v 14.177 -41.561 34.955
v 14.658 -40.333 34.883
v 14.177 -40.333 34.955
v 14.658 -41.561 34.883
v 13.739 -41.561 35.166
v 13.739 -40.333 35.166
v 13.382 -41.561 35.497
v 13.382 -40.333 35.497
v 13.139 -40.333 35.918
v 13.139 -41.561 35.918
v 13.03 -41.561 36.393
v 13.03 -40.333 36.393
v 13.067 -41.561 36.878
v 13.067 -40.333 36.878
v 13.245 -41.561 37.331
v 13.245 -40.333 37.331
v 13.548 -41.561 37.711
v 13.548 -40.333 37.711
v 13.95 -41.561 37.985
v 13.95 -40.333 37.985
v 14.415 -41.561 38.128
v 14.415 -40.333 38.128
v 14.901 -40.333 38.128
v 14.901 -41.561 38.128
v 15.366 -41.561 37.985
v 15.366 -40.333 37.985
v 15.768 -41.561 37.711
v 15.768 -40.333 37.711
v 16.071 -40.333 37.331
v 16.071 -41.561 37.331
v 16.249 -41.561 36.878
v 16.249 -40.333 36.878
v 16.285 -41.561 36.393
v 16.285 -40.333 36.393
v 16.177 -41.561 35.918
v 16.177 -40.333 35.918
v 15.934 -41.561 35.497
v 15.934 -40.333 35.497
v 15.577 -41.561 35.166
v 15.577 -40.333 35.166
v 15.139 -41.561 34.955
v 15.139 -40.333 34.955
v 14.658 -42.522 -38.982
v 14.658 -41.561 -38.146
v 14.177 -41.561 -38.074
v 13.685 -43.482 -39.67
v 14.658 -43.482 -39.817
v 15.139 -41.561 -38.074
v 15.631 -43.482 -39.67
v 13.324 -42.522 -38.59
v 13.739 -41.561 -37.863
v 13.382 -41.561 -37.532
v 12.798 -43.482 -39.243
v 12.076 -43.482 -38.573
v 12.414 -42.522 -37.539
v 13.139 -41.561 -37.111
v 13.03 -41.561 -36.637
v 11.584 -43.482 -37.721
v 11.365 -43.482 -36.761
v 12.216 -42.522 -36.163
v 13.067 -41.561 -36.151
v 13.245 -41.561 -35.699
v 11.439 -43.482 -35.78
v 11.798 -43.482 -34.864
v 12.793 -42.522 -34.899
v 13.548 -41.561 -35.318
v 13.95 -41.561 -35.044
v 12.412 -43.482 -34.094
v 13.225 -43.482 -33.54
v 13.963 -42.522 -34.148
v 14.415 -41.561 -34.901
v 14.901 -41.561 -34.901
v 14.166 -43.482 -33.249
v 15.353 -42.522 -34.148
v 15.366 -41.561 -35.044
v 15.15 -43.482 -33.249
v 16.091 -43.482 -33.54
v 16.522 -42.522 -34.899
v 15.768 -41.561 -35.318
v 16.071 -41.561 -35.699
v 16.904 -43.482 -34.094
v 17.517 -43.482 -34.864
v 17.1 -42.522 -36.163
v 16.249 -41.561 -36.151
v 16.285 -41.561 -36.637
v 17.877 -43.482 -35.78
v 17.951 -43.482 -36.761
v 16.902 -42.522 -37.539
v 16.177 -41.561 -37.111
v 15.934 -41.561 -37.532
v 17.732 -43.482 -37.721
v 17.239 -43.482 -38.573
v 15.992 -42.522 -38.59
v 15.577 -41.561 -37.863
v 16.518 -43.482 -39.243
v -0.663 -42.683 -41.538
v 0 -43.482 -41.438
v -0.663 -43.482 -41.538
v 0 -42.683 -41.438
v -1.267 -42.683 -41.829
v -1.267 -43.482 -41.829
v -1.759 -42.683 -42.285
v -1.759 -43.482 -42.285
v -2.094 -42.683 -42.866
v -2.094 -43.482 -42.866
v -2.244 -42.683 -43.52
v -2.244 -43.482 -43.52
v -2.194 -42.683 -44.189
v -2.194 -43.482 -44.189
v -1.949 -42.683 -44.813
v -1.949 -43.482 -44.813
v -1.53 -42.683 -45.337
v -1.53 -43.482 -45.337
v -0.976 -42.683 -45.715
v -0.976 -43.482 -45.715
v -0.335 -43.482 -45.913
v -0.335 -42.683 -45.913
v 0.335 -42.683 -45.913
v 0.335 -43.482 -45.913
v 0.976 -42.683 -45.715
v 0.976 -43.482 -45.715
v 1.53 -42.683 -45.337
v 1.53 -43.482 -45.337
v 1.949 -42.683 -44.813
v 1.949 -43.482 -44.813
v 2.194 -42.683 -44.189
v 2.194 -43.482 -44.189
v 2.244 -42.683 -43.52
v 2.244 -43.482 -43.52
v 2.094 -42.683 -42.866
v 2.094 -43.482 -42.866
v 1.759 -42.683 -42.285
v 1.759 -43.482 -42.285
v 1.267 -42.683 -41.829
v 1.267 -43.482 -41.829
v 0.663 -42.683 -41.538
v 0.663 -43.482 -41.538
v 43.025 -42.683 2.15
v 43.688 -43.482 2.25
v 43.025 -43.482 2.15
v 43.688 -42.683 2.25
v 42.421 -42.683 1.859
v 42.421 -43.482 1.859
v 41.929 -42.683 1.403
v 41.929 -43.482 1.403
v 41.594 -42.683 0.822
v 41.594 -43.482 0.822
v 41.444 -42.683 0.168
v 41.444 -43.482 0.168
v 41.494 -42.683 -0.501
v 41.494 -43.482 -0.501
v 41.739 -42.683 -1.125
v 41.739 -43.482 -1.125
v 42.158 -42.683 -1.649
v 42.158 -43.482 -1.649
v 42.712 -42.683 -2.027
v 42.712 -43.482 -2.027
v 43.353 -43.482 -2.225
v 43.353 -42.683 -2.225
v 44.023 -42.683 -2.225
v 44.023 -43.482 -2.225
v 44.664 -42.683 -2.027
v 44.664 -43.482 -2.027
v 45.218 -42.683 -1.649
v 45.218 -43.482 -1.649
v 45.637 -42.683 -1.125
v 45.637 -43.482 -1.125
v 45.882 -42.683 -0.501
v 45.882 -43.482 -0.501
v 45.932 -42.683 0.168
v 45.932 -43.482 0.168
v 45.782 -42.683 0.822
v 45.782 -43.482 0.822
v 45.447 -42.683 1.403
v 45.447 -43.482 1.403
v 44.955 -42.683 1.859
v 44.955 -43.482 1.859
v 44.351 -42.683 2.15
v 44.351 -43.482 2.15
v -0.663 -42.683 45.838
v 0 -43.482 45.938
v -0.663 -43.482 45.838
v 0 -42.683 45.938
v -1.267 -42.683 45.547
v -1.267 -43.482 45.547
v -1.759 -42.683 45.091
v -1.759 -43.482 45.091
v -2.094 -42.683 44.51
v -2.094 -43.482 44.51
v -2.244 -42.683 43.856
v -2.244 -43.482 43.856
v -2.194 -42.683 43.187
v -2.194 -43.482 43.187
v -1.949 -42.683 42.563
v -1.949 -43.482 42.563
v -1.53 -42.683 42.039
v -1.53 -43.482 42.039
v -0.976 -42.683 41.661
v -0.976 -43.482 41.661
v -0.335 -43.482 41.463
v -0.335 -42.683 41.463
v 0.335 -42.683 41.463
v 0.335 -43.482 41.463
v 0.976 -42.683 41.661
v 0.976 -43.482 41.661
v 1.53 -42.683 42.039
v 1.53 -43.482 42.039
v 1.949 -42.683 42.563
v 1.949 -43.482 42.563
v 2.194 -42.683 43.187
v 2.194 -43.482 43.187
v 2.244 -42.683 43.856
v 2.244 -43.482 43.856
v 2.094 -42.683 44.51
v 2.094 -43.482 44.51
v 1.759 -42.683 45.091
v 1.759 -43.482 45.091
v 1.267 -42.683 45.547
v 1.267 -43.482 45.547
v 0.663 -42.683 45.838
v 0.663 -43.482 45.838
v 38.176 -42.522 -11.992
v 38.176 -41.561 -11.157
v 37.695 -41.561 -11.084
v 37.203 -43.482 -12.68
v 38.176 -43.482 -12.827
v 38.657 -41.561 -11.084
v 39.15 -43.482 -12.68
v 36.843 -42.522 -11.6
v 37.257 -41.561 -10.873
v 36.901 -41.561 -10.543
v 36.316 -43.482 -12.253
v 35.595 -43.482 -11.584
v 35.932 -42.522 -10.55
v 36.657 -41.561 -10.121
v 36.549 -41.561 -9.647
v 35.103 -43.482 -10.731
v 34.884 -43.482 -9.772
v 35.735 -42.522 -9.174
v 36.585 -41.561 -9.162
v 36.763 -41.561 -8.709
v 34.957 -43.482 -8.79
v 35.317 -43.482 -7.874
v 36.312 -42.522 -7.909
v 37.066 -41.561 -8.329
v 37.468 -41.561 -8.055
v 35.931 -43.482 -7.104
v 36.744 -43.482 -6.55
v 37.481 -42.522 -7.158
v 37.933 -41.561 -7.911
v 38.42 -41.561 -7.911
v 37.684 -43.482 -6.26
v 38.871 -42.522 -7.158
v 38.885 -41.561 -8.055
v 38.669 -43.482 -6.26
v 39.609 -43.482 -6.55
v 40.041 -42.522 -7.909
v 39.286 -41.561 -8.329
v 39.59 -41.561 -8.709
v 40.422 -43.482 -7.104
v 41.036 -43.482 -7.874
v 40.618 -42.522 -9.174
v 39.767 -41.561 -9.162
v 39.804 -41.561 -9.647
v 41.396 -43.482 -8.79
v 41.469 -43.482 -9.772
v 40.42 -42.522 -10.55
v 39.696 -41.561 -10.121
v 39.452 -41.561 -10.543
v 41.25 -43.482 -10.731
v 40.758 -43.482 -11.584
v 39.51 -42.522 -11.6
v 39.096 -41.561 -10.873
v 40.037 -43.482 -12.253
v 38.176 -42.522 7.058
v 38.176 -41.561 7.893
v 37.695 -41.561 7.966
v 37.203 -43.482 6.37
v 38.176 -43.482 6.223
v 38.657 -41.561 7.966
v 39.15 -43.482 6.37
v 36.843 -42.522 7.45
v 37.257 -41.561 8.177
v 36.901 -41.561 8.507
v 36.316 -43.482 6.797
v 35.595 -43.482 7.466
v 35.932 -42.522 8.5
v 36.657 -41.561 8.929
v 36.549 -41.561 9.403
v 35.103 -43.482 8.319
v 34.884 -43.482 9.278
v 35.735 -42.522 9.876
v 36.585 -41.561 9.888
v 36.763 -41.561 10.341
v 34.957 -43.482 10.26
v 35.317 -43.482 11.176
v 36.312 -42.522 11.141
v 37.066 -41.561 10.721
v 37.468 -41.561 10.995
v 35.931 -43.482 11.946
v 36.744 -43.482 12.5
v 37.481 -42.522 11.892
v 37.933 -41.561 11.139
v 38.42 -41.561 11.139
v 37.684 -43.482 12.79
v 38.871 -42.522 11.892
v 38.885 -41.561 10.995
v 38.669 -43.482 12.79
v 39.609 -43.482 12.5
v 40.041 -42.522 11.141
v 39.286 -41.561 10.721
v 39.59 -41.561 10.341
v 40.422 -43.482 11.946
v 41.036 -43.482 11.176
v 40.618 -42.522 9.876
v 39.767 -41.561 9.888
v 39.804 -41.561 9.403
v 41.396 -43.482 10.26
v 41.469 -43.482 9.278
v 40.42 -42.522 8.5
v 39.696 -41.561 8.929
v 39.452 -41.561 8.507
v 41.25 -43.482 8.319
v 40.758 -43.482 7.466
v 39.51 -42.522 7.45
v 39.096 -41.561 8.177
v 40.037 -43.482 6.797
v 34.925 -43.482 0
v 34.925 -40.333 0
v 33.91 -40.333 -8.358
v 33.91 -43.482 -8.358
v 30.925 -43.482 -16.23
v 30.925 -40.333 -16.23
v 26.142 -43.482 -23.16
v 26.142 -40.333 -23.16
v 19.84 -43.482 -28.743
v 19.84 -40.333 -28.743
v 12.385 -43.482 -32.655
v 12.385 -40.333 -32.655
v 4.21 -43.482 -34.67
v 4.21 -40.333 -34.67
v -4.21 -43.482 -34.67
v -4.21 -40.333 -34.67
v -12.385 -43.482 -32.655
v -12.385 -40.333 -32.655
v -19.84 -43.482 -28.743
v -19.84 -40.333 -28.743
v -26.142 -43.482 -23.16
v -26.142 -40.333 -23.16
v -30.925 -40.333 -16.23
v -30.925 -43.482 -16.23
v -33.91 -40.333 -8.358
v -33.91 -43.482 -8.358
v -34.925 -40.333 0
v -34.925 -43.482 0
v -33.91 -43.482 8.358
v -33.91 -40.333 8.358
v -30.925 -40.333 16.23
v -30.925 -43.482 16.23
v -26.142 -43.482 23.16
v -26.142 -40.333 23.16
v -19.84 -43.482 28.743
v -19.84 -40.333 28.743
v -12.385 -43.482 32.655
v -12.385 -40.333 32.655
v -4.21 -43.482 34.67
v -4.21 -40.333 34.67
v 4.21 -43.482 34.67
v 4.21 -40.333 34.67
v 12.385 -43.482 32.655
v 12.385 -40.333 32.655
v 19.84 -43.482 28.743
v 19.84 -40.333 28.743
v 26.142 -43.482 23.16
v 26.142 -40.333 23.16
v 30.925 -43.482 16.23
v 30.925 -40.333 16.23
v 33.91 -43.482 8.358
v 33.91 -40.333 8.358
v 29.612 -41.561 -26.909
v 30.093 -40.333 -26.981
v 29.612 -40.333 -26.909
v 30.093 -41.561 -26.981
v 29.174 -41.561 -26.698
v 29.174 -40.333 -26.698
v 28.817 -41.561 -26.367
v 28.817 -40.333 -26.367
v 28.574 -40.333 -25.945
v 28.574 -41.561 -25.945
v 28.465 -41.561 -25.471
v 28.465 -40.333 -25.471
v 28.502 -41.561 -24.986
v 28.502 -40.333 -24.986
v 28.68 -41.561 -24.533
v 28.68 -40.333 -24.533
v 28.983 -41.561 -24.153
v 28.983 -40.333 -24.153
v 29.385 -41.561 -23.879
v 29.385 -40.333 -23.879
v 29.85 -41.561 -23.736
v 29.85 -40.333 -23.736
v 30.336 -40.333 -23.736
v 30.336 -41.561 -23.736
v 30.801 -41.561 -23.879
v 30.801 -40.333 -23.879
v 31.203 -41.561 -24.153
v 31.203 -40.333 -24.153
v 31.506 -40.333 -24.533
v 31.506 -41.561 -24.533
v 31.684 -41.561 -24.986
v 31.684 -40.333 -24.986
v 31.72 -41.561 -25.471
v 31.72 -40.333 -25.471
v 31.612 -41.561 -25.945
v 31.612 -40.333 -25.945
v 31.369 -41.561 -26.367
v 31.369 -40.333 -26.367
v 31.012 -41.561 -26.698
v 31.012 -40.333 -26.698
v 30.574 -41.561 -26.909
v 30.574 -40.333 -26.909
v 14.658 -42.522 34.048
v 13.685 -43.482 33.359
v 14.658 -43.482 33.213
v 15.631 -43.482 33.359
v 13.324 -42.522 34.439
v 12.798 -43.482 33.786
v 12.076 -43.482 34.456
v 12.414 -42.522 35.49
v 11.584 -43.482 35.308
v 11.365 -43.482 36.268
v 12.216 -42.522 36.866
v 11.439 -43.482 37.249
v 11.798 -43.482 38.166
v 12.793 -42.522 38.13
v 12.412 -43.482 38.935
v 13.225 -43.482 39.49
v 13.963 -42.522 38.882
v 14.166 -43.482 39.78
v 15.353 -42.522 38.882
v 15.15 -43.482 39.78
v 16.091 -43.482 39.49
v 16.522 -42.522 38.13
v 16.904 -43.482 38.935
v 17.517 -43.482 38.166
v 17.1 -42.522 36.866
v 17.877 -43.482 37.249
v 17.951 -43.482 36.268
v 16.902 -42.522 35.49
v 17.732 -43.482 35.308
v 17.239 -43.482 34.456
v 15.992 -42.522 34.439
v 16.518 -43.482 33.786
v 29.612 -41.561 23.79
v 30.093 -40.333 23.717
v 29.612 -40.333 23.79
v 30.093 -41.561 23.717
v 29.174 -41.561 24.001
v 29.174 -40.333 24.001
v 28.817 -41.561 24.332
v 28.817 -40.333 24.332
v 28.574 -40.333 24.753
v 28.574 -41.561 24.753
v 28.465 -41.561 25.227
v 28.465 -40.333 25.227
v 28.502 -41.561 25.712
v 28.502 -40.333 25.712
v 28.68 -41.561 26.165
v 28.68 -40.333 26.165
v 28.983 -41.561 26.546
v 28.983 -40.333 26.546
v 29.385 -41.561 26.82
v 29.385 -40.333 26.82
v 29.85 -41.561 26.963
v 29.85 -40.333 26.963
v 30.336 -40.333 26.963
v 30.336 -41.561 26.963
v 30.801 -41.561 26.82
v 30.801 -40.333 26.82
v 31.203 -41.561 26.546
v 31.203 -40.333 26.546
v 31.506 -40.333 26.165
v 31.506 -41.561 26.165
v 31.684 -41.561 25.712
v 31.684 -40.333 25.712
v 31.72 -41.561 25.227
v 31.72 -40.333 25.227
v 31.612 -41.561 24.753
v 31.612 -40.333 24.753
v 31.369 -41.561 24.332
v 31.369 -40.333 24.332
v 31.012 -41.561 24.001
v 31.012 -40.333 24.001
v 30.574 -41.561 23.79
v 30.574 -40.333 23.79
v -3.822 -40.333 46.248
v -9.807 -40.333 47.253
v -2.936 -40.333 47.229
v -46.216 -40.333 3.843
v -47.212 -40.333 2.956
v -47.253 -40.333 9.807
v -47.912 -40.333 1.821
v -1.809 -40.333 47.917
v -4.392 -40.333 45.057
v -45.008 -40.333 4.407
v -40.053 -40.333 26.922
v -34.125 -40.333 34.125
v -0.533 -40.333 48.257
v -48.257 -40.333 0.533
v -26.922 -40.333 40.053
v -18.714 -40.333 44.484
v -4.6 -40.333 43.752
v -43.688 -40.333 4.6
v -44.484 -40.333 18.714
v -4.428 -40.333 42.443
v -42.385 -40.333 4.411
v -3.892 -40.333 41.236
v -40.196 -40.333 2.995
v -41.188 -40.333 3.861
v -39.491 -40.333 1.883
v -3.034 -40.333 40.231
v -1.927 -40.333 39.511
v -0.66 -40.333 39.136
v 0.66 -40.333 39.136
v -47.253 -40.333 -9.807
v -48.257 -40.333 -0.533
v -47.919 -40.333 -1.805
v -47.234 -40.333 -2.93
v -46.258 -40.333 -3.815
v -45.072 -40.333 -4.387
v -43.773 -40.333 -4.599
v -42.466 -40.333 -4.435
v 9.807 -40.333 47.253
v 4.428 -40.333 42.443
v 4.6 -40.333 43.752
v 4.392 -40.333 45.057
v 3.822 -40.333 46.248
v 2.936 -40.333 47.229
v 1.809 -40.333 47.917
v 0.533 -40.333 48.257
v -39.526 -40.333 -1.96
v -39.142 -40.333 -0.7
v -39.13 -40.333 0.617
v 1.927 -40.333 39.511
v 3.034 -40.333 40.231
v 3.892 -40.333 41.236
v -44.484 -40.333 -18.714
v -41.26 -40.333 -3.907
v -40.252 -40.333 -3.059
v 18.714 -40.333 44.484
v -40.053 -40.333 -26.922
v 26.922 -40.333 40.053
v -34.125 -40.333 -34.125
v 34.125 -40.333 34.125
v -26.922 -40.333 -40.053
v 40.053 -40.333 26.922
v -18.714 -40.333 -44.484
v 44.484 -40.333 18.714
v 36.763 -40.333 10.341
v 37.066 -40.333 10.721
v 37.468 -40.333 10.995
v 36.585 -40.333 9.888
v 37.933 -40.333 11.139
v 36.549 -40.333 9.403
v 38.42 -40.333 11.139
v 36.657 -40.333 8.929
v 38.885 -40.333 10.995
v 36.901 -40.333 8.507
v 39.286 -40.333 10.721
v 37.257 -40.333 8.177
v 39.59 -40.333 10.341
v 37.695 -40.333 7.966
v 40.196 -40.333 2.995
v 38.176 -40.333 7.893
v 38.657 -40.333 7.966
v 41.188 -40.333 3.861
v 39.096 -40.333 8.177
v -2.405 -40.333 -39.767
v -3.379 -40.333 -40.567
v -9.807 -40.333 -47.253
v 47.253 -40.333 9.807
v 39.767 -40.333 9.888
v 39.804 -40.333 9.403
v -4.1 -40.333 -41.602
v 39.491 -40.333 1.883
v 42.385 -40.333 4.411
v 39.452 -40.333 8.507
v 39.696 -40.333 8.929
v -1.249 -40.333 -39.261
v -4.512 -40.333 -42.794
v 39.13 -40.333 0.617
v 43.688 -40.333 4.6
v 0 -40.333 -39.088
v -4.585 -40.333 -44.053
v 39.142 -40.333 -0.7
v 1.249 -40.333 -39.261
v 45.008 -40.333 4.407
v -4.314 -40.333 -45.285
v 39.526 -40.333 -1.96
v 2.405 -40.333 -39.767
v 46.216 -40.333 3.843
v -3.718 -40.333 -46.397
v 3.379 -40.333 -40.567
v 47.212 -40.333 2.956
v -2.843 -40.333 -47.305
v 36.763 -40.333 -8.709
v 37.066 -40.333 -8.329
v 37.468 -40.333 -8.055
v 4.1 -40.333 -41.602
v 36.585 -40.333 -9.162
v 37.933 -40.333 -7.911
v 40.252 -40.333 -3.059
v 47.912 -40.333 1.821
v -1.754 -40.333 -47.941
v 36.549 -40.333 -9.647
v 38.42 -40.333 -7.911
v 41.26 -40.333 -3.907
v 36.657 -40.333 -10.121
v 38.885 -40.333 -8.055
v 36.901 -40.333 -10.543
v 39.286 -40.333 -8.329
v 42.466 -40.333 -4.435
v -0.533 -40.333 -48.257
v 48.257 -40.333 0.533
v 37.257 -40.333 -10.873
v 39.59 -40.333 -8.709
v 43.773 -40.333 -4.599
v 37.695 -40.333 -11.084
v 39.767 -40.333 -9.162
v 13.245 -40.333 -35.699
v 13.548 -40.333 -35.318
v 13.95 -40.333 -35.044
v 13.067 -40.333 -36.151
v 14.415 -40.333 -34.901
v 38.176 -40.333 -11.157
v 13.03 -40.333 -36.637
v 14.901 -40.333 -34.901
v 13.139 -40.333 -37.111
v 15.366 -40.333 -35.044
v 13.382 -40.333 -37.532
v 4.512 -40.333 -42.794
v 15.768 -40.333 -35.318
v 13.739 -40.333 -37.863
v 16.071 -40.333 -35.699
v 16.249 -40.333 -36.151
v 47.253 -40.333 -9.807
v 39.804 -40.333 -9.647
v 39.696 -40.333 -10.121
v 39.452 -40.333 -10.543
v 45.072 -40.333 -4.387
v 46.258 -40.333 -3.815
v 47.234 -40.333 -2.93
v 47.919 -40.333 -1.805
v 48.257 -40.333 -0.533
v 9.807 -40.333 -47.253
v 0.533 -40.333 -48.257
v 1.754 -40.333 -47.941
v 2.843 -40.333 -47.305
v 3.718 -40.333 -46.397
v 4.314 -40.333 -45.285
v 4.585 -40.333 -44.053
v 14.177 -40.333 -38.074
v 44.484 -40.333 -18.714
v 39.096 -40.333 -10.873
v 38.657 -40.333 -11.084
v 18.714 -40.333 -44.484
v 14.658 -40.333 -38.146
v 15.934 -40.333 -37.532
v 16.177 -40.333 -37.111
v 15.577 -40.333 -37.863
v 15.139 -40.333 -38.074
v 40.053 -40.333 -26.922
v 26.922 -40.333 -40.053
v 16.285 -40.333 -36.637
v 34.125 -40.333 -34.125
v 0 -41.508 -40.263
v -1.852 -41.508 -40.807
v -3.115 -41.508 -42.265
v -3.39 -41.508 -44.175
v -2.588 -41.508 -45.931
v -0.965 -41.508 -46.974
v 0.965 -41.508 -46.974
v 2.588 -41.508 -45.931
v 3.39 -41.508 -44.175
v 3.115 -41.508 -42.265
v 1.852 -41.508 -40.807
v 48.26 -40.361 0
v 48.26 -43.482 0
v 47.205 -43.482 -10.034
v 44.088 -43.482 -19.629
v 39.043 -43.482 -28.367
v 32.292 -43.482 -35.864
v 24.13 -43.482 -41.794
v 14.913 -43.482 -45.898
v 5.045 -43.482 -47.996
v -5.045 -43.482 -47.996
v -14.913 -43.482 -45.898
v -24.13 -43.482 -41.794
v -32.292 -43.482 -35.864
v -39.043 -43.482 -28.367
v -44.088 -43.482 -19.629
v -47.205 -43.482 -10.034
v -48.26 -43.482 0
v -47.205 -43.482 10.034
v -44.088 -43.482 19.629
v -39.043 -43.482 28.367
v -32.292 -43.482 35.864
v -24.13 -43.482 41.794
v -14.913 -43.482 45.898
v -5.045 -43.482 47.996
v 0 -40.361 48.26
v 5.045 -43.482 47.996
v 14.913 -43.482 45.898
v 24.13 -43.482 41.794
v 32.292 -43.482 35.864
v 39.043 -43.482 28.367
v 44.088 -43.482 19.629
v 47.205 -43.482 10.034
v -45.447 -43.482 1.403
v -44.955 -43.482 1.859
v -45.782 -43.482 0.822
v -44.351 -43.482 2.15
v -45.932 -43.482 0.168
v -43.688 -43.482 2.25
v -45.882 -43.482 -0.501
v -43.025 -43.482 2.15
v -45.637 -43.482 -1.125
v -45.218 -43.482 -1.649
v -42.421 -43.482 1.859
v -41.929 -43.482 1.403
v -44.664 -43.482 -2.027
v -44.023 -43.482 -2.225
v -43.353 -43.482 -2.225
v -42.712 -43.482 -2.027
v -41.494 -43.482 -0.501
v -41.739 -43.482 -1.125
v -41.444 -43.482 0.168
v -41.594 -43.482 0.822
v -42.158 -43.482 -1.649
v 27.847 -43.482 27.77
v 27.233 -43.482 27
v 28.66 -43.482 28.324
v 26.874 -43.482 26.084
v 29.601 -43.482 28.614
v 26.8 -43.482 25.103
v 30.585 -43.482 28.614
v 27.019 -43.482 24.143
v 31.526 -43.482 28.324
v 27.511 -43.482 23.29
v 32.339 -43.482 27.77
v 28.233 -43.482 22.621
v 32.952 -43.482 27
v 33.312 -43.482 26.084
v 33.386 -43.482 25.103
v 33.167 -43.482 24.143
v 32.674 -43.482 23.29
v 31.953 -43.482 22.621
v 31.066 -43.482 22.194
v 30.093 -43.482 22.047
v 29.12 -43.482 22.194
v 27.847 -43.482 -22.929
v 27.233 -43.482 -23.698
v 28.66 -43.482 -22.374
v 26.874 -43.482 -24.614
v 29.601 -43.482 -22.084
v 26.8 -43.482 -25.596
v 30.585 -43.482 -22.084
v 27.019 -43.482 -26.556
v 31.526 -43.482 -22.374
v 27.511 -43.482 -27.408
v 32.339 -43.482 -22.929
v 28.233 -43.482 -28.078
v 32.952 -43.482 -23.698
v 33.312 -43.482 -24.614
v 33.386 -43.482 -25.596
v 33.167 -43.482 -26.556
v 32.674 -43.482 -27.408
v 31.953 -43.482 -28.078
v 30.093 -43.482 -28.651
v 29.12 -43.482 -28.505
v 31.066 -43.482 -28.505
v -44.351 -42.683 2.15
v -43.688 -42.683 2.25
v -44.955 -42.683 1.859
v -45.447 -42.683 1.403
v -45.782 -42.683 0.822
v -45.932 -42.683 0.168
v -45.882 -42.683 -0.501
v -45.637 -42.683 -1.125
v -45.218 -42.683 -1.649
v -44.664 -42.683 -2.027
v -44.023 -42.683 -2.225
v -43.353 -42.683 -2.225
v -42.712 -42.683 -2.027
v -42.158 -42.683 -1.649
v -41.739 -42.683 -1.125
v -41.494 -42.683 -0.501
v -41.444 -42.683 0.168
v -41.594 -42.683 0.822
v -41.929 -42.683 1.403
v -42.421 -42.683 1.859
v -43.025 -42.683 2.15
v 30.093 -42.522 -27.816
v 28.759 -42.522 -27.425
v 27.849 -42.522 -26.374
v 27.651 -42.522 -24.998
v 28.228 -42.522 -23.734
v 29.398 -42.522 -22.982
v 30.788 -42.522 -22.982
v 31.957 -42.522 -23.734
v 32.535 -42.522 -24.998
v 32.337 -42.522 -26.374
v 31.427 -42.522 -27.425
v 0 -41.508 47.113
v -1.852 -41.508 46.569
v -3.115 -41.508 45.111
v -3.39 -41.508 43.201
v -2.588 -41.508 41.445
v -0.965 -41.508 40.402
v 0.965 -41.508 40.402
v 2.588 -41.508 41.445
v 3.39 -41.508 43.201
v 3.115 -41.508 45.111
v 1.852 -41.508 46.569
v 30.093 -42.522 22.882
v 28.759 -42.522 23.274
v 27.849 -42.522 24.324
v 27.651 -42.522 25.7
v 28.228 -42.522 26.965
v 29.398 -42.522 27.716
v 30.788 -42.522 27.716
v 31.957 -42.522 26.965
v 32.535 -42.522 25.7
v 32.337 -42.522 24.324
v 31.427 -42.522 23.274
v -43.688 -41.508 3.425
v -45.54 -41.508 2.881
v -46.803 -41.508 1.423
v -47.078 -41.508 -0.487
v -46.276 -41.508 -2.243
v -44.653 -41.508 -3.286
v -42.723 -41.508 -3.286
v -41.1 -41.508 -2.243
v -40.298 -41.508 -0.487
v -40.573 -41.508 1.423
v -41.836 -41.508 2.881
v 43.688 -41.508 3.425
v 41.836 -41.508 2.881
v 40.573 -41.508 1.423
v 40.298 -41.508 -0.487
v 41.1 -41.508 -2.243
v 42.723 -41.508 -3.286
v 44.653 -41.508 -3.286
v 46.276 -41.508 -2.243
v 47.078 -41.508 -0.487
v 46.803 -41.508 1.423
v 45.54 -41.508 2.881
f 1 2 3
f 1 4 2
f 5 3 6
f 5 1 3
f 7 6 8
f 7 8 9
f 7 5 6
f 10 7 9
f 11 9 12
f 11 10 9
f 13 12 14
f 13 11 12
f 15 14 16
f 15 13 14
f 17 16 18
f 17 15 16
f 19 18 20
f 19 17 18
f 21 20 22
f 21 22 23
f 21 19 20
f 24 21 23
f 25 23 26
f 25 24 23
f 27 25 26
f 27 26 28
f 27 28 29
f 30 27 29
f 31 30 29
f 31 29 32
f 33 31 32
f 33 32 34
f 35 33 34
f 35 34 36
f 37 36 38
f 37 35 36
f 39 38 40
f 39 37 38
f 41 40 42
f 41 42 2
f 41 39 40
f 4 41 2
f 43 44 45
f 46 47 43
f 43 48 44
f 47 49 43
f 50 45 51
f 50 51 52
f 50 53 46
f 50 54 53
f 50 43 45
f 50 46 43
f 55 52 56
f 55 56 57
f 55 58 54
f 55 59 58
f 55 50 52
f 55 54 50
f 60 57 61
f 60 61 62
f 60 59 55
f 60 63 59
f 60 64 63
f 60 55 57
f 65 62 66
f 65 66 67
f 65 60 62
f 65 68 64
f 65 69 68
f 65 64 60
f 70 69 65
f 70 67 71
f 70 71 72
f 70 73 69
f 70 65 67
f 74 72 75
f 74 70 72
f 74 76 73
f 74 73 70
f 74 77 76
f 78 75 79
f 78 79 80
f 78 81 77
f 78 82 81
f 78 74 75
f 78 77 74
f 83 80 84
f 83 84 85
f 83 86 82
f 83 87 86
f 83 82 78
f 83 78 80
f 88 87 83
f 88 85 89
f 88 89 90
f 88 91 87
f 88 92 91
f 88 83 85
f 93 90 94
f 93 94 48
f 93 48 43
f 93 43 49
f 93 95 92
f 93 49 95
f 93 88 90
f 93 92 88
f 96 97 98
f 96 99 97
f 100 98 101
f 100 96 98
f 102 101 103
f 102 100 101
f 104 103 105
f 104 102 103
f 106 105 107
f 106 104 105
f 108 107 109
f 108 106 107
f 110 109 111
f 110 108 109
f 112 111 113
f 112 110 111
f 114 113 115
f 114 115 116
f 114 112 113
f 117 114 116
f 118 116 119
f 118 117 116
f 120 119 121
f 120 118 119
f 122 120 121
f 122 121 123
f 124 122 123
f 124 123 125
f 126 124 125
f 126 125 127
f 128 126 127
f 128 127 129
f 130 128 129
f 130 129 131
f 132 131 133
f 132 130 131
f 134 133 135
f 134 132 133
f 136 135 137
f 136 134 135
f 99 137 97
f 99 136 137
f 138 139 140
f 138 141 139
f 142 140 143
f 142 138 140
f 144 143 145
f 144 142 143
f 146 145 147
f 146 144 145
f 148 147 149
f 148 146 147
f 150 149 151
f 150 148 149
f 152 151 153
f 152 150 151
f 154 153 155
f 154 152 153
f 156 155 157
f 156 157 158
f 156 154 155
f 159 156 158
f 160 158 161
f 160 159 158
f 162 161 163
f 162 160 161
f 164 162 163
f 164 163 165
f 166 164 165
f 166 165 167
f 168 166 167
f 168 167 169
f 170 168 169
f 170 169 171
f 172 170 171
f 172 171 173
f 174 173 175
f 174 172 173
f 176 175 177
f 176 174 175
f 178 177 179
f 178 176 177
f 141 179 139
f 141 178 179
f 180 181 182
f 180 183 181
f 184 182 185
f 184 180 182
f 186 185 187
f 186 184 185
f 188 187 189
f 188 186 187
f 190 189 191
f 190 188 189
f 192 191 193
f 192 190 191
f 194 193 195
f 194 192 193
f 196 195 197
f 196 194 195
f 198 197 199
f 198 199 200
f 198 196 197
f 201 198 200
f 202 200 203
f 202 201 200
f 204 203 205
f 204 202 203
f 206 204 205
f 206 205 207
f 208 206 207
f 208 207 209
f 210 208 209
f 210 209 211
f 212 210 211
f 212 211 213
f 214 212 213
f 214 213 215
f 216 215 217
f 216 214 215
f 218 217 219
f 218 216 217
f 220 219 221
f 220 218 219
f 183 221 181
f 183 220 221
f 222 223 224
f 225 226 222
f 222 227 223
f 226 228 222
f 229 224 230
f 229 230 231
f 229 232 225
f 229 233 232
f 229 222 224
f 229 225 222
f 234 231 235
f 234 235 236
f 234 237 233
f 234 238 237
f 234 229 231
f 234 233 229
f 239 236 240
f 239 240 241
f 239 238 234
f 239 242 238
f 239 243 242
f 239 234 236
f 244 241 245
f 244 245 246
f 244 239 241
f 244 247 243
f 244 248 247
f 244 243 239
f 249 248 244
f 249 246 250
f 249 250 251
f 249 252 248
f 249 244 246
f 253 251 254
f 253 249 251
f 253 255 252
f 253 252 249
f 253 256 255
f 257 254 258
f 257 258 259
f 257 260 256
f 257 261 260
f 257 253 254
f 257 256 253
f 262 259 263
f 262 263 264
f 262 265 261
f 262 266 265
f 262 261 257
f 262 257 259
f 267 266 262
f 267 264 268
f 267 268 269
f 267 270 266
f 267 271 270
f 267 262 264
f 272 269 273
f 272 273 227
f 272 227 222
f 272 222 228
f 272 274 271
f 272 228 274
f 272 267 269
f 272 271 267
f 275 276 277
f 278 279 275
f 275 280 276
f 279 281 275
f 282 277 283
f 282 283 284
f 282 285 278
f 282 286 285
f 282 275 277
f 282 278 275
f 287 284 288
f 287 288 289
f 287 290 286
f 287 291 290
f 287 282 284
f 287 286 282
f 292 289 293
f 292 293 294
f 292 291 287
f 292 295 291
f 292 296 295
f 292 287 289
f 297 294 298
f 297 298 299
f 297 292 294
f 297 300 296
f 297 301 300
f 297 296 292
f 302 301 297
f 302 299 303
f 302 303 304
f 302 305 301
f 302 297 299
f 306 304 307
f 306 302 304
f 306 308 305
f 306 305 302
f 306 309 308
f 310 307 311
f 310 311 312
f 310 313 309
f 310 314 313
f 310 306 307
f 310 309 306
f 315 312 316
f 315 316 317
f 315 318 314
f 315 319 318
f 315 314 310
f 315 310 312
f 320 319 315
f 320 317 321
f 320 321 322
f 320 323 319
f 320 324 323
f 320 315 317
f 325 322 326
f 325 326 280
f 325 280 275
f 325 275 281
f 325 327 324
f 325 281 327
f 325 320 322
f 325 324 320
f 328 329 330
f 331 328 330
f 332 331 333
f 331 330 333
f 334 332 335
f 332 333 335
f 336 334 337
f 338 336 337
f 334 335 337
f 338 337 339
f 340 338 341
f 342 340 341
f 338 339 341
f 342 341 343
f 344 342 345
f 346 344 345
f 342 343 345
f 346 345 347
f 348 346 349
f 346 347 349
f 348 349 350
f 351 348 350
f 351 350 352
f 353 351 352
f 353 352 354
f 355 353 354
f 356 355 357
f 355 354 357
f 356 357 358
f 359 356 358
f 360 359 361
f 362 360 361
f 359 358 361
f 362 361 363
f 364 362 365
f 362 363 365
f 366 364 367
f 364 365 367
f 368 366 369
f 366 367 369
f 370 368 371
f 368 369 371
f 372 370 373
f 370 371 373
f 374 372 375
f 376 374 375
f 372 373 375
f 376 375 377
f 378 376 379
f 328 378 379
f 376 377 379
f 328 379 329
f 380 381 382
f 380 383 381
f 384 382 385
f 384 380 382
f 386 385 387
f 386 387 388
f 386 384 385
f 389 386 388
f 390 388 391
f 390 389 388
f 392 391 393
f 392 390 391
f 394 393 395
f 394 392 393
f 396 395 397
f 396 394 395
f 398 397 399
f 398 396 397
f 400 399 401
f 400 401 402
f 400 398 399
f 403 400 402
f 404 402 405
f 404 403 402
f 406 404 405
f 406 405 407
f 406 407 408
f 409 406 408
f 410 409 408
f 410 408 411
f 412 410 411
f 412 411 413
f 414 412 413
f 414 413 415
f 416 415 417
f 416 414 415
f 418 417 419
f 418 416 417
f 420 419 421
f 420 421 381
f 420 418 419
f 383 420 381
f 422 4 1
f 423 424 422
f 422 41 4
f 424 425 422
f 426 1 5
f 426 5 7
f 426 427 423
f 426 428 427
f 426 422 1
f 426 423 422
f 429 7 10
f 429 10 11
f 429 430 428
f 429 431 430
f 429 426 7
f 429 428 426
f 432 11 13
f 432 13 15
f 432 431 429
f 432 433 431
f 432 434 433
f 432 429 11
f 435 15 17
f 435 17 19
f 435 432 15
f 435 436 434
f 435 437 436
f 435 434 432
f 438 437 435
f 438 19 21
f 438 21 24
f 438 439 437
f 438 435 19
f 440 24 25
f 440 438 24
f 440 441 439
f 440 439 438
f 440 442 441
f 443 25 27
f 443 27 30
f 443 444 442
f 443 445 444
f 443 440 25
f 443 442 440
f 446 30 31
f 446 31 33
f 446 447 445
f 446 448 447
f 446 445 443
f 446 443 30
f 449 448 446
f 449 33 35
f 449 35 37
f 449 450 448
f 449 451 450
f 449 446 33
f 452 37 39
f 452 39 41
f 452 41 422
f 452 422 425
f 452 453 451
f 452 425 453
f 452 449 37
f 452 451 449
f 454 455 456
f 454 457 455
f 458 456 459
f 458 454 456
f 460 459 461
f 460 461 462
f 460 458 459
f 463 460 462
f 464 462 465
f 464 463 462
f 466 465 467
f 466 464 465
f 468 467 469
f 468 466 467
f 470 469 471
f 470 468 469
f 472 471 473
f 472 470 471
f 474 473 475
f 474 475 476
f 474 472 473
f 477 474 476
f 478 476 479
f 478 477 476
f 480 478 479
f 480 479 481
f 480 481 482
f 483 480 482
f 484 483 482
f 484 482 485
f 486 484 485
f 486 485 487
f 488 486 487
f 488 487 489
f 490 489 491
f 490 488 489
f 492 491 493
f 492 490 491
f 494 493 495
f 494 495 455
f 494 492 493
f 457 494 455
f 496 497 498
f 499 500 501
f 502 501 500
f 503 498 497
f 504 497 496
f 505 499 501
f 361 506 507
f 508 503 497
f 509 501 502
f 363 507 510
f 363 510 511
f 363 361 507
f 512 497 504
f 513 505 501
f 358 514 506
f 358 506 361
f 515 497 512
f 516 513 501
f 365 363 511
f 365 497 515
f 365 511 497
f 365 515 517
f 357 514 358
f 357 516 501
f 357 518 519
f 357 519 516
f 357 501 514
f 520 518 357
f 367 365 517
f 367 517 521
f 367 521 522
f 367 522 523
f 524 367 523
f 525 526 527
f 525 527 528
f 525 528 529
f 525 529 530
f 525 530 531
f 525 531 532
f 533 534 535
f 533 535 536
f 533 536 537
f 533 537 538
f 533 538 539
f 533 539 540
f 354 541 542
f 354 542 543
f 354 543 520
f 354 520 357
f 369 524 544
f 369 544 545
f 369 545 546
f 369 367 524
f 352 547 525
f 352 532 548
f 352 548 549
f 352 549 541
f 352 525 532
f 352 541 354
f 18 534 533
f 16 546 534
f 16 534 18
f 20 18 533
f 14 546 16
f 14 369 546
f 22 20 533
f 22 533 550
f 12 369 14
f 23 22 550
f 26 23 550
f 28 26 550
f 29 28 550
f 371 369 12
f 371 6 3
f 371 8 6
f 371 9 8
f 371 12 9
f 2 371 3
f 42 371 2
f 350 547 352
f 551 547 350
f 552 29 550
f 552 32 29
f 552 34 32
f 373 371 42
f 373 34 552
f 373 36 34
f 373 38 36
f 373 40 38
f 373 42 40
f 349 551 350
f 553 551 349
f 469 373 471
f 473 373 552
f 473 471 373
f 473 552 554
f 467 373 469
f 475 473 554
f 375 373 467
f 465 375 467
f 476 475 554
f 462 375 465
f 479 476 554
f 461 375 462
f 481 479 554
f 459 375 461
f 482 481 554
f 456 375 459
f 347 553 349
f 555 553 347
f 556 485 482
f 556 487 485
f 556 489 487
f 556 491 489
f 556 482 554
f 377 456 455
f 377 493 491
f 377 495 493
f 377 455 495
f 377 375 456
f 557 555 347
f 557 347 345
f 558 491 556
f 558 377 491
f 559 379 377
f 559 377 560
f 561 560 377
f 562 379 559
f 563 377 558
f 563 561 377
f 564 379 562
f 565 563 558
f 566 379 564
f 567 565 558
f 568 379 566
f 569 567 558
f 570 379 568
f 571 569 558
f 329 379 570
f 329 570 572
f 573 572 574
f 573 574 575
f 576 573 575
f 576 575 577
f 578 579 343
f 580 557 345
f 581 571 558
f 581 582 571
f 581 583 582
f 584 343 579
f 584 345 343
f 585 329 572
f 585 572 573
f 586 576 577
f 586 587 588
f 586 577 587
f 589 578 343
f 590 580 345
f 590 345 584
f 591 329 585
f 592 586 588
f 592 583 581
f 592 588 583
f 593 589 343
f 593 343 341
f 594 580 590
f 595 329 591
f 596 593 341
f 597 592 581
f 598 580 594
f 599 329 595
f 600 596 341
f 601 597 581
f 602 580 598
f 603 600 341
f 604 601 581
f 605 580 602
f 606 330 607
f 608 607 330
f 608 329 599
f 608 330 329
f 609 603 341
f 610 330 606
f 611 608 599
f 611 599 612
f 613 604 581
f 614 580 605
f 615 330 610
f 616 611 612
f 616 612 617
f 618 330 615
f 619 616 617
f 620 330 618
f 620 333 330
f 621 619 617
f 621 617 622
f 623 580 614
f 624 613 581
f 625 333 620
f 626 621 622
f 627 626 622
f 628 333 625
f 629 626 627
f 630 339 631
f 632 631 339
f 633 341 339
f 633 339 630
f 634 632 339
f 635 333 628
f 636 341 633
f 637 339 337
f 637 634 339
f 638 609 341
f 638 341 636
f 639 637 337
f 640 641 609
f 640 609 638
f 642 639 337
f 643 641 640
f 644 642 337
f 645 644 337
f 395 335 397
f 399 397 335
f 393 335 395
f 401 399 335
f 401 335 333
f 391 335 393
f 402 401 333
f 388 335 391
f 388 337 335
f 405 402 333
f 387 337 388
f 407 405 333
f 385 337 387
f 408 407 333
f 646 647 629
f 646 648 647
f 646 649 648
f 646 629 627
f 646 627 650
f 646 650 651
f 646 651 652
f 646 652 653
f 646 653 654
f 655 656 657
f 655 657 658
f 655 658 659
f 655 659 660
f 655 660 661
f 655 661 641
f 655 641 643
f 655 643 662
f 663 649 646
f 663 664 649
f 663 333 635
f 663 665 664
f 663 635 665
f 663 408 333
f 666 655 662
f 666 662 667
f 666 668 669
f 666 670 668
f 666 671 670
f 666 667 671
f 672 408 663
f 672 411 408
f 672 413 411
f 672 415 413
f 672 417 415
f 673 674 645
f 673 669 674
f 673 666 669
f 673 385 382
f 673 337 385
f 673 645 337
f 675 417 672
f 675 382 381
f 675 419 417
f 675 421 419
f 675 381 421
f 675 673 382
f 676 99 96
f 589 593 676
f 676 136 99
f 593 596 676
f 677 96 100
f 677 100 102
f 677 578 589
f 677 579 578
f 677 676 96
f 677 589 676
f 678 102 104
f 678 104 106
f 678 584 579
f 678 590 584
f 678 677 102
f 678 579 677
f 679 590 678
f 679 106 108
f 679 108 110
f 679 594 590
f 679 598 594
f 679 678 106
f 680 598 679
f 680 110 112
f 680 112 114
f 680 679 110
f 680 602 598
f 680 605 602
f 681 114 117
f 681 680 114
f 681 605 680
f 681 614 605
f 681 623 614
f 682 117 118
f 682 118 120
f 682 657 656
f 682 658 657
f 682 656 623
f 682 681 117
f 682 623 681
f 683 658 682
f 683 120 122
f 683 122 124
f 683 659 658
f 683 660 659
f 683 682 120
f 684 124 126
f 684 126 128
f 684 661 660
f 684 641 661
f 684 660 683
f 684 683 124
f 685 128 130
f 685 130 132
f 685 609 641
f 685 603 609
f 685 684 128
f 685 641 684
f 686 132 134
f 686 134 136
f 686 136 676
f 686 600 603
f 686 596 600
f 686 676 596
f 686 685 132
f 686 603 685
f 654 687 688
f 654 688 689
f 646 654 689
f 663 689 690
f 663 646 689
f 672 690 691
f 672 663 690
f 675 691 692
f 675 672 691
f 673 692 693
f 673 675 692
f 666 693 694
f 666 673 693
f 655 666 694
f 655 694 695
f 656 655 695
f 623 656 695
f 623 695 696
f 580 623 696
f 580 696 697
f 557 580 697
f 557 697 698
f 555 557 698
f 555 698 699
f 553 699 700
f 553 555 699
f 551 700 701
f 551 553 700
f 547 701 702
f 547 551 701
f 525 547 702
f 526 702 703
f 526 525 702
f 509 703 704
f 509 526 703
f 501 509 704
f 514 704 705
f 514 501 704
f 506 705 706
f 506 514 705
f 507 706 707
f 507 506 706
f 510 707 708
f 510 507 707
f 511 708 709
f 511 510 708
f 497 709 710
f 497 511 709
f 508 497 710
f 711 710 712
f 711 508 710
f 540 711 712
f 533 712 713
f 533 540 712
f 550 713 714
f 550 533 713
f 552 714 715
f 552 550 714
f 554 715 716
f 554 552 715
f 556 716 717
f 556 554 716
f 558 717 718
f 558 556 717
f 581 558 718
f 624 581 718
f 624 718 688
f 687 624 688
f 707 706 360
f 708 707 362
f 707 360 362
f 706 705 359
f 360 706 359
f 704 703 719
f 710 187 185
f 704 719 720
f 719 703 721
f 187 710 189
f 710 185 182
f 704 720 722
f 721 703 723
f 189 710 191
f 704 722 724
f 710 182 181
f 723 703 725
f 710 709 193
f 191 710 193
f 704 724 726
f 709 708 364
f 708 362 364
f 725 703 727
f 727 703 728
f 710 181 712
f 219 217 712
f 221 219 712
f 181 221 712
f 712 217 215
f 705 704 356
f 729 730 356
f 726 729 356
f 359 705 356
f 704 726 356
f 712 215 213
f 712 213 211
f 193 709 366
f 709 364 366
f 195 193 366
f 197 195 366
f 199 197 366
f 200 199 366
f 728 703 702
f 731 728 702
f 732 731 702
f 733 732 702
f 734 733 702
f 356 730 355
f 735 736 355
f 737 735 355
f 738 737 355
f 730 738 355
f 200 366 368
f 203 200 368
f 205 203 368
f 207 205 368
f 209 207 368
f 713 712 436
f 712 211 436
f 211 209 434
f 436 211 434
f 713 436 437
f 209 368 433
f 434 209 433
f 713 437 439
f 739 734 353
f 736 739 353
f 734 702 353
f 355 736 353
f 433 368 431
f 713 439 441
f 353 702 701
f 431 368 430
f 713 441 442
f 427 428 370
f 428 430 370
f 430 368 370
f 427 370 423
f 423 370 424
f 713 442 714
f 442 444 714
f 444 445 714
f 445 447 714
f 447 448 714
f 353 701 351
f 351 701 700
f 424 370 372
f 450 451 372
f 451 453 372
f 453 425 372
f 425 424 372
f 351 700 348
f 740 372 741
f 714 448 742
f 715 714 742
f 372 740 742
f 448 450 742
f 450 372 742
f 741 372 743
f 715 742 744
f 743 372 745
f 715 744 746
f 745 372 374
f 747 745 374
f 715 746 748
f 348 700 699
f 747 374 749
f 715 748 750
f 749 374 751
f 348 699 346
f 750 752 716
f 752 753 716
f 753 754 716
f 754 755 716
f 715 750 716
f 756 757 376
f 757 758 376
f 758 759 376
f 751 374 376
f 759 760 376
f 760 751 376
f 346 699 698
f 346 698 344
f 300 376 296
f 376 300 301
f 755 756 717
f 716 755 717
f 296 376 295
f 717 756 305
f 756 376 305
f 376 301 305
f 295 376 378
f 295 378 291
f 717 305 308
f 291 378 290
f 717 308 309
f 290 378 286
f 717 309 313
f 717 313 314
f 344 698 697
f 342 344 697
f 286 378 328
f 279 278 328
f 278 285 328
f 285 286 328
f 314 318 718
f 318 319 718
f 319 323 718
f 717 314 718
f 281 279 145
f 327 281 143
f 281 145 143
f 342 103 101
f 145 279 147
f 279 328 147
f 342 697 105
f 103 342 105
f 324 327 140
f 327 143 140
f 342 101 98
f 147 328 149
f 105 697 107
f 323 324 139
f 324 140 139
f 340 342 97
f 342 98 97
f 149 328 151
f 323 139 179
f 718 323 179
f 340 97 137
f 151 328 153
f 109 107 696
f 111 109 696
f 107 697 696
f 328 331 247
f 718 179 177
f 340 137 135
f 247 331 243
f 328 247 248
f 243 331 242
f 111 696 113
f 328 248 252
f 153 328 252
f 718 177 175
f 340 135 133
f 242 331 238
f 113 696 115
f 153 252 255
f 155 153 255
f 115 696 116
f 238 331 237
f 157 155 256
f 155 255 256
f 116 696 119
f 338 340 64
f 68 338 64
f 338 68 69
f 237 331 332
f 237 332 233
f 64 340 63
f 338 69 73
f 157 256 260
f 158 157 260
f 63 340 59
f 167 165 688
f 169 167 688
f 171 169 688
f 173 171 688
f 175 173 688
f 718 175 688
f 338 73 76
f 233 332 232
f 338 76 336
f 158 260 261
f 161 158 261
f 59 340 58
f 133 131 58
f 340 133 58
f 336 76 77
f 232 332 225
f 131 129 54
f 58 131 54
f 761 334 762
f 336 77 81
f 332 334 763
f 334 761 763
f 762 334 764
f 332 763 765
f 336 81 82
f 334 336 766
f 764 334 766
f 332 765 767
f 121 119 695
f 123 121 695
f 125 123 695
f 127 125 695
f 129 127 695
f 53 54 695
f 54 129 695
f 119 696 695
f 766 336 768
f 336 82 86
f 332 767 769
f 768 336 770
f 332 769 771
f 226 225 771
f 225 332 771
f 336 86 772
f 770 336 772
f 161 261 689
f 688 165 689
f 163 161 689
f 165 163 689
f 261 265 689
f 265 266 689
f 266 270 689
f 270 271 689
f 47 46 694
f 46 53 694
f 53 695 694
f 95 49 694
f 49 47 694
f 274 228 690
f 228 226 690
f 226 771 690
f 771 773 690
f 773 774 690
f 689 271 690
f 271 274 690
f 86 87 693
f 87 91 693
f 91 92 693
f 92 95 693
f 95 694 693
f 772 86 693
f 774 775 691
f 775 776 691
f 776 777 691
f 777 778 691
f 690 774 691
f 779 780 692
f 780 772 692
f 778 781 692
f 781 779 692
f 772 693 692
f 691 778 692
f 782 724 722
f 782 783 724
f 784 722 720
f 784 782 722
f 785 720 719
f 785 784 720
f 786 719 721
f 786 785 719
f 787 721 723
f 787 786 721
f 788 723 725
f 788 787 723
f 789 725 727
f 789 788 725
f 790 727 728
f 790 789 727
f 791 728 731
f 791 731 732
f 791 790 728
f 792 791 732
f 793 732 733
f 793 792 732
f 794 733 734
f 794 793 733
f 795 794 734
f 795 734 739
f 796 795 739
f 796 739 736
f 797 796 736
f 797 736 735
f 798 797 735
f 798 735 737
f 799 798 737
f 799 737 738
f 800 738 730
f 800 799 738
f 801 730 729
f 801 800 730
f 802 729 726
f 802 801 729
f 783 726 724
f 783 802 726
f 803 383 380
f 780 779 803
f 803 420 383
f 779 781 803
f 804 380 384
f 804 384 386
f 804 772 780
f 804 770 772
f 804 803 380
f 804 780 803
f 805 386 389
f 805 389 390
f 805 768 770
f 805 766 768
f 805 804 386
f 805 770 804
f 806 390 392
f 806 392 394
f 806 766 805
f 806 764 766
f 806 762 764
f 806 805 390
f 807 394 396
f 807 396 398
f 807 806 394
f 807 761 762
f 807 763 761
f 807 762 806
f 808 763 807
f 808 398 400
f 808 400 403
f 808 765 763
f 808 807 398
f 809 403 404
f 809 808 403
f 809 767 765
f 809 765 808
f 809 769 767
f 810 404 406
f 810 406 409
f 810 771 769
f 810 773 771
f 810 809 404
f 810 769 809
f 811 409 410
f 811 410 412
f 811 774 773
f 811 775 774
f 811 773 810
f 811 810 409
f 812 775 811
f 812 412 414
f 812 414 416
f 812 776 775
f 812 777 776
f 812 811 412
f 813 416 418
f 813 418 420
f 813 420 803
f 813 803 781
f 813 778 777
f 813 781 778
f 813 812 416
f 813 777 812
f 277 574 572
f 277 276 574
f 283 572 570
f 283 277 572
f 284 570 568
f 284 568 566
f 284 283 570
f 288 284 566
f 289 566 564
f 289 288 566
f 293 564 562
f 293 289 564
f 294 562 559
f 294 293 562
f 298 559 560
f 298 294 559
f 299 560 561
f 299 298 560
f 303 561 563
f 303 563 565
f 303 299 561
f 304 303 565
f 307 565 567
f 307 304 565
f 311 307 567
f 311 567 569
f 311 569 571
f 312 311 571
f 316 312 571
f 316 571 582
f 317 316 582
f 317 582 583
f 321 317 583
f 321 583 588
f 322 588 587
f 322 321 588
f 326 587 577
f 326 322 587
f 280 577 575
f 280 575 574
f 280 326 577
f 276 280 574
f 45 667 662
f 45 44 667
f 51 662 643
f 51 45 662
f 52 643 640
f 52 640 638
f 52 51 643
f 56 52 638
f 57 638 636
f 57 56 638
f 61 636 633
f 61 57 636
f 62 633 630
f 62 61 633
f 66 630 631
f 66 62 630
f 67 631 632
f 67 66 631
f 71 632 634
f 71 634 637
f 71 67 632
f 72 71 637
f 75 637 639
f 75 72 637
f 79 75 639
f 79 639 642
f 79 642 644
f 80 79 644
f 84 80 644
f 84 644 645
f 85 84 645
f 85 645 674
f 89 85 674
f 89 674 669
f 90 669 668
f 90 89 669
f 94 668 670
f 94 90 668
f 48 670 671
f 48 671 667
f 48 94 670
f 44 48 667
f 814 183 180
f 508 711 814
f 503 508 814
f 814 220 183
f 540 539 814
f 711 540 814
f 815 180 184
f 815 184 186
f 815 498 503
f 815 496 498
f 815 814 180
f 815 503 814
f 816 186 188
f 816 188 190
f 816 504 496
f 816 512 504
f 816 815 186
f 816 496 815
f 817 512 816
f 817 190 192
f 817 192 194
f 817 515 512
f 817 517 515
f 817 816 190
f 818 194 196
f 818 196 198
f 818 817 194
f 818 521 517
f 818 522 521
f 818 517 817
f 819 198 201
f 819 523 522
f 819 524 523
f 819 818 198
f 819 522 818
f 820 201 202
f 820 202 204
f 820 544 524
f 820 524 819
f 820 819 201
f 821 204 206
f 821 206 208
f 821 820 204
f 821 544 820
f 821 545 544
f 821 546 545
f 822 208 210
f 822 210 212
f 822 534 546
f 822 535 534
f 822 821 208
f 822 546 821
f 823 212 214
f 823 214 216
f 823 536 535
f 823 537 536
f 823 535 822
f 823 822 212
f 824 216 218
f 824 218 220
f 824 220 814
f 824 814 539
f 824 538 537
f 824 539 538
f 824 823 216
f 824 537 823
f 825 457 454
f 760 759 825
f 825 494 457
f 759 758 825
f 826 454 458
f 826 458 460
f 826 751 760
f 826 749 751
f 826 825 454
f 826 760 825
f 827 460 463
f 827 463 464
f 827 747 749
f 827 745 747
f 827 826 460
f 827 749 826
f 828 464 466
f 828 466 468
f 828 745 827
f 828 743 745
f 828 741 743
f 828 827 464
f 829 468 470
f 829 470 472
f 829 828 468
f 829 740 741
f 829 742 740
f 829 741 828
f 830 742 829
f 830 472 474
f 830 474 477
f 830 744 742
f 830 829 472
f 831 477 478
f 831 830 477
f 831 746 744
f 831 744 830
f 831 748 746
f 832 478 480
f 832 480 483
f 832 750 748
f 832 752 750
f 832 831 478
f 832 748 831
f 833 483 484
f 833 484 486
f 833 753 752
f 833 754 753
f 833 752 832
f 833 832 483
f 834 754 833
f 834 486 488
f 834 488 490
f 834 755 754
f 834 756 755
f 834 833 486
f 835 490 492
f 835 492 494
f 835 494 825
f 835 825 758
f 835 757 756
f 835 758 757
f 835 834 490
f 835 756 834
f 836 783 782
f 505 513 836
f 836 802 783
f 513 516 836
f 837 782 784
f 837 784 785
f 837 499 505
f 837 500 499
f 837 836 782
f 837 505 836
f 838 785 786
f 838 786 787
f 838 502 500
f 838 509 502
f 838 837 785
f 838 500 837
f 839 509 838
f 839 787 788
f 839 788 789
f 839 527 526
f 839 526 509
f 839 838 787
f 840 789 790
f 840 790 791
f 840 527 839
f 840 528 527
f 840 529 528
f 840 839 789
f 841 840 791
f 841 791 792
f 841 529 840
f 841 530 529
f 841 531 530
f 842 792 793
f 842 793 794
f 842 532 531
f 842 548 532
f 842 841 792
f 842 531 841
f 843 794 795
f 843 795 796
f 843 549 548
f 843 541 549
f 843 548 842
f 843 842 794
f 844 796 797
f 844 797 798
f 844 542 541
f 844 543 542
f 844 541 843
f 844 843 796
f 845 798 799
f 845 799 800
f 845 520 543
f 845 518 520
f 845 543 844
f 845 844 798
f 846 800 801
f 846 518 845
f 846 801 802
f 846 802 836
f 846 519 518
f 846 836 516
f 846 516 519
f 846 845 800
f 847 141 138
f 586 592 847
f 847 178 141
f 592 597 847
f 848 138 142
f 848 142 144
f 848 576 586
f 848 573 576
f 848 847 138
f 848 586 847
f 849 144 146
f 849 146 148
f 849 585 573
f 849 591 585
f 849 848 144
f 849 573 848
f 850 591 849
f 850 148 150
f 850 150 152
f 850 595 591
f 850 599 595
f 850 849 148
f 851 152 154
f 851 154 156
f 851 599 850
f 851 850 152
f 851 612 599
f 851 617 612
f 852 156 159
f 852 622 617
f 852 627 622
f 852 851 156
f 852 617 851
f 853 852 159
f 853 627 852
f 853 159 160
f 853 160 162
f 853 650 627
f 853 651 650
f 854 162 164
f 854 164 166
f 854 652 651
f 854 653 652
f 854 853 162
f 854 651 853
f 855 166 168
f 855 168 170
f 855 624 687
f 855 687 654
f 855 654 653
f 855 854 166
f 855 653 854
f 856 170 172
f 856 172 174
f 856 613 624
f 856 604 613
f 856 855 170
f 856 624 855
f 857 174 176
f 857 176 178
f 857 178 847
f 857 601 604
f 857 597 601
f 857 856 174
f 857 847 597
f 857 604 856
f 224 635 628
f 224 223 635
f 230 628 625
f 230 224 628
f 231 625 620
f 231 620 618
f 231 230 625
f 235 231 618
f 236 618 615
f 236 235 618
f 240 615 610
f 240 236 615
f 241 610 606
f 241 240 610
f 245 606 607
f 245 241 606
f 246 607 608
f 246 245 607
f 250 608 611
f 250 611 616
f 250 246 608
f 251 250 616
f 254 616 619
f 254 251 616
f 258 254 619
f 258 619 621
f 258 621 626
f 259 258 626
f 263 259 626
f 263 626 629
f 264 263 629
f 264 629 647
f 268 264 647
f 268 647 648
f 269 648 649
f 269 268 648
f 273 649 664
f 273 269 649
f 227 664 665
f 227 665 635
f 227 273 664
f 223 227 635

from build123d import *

# Parameters (mm, degrees)
SKETCH3_R                                      = 48.26
SKETCH3_R_2                                    = 34.925
BOSS_EXTRUDE1_DEPTH                            = 3.1496
CSK_FOR_M4_FLAT_HEAD_MACHINE_SCREW2_AT_2_COUNT = 2
CSK_FOR_M4_FLAT_HEAD_MACHINE_SCREW2_AT_2_PITCH = 61.784162113
CSK_FOR_M4_FLAT_HEAD_MACHINE_SCREW2_AT_3_COUNT = 2
CSK_FOR_M4_FLAT_HEAD_MACHINE_SCREW2_AT_3_PITCH = 87.376
CSK_FOR_M4_FLAT_HEAD_MACHINE_SCREW2_AT_4_COUNT = 2
CSK_FOR_M4_FLAT_HEAD_MACHINE_SCREW2_AT_4_PITCH = 61.784162113
CSK_FOR_4_FLAT_HEAD_MACHINE_SCREW1_AT_2_COUNT  = 2
CSK_FOR_4_FLAT_HEAD_MACHINE_SCREW1_AT_2_PITCH  = 19.05
CSK_FOR_4_FLAT_HEAD_MACHINE_SCREW1_AT_3_COUNT  = 2
CSK_FOR_4_FLAT_HEAD_MACHINE_SCREW1_AT_3_PITCH  = 35.79885845
CSK_FOR_4_FLAT_HEAD_MACHINE_SCREW1_AT_4_COUNT  = 2
CSK_FOR_4_FLAT_HEAD_MACHINE_SCREW1_AT_4_PITCH  = 51.698767879
CSK_FOR_4_FLAT_HEAD_MACHINE_SCREW1_AT_5_COUNT  = 2
CSK_FOR_4_FLAT_HEAD_MACHINE_SCREW1_AT_5_PITCH  = 63.760255082
CSK_FOR_4_FLAT_HEAD_MACHINE_SCREW1_AT_6_COUNT  = 2
CSK_FOR_4_FLAT_HEAD_MACHINE_SCREW1_AT_6_PITCH  = 73.02909889


with BuildPart() as part:
    # Sketch3 → Boss-Extrude1 (new body)
    with BuildSketch(Plane(origin=(0, -40.33266, 0), x_dir=(1, 0, 0), z_dir=(0, 1, 0))):
        Circle(SKETCH3_R)
        Circle(SKETCH3_R_2, mode=Mode.SUBTRACT)
    extrude(amount=-BOSS_EXTRUDE1_DEPTH)

    # Sketch18 → CSK for M4 Flat Head Machine Screw2 (revolve, cut)
    with BuildSketch(Plane(origin=(0, -40.33266, 43.688), x_dir=(0, 0, 1), z_dir=(1, 0, 0))):
        Polygon((0, 0), (0, 3.1496), (2.25, 3.1496), (2.25, 2.35), (4.6, 0), align=None)
    csk_for_m4_flat_head_machine_screw2 = revolve(axis=Axis((0, -33.98266, 43.688), (0, -1, 0)), mode=Mode.SUBTRACT)

    # CSK for M4 Flat Head Machine Screw2 at 2: CSK for M4 Flat Head Machine Screw2 ×2
    with Locations(*[Vector(0.707106781, 0, -0.707106781) * (i * CSK_FOR_M4_FLAT_HEAD_MACHINE_SCREW2_AT_2_PITCH) for i in range(1, CSK_FOR_M4_FLAT_HEAD_MACHINE_SCREW2_AT_2_COUNT)]):
        add(csk_for_m4_flat_head_machine_screw2, mode=Mode.SUBTRACT)

    # CSK for M4 Flat Head Machine Screw2 at 3: CSK for M4 Flat Head Machine Screw2 ×2
    with Locations(*[(0, 0, -i * CSK_FOR_M4_FLAT_HEAD_MACHINE_SCREW2_AT_3_PITCH) for i in range(1, CSK_FOR_M4_FLAT_HEAD_MACHINE_SCREW2_AT_3_COUNT)]):
        add(csk_for_m4_flat_head_machine_screw2, mode=Mode.SUBTRACT)

    # CSK for M4 Flat Head Machine Screw2 at 4: CSK for M4 Flat Head Machine Screw2 ×2
    with Locations(*[Vector(-0.707106781, 0, -0.707106781) * (i * CSK_FOR_M4_FLAT_HEAD_MACHINE_SCREW2_AT_4_PITCH) for i in range(1, CSK_FOR_M4_FLAT_HEAD_MACHINE_SCREW2_AT_4_COUNT)]):
        add(csk_for_m4_flat_head_machine_screw2, mode=Mode.SUBTRACT)

    # Sketch9 → CSK for #4 Flat Head Machine Screw1 (revolve, cut)
    with BuildSketch(Plane(origin=(14.657877005, -43.48226, 36.514549445), x_dir=(0, 0, -1), z_dir=(1, 0, 0))):
        Polygon((0, 0), (0, 3.1496), (1.63195, 3.1496), (1.63195, 1.921172758), (3.302, 0), align=None)
    csk_for_4_flat_head_machine_screw1 = revolve(axis=Axis((14.657877005, -49.83226, 36.514549445), (0, 1, 0)), mode=Mode.SUBTRACT)

    # CSK for #4 Flat Head Machine Screw1 at 2: CSK for #4 Flat Head Machine Screw1 ×2
    with Locations(*[Vector(0.810235621, 0, -0.58610429) * (i * CSK_FOR_4_FLAT_HEAD_MACHINE_SCREW1_AT_2_PITCH) for i in range(1, CSK_FOR_4_FLAT_HEAD_MACHINE_SCREW1_AT_2_COUNT)]):
        add(csk_for_4_flat_head_machine_screw1, mode=Mode.SUBTRACT)

    # CSK for #4 Flat Head Machine Screw1 at 3: CSK for #4 Flat Head Machine Screw1 ×2
    with Locations(*[Vector(0.65696386, 0, -0.753922069) * (i * CSK_FOR_4_FLAT_HEAD_MACHINE_SCREW1_AT_3_PITCH) for i in range(1, CSK_FOR_4_FLAT_HEAD_MACHINE_SCREW1_AT_3_COUNT)]):
        add(csk_for_4_flat_head_machine_screw1, mode=Mode.SUBTRACT)

    # CSK for #4 Flat Head Machine Screw1 at 4: CSK for #4 Flat Head Machine Screw1 ×2
    with Locations(*[Vector(0.454915217, 0, -0.890534752) * (i * CSK_FOR_4_FLAT_HEAD_MACHINE_SCREW1_AT_4_PITCH) for i in range(1, CSK_FOR_4_FLAT_HEAD_MACHINE_SCREW1_AT_4_COUNT)]):
        add(csk_for_4_flat_head_machine_screw1, mode=Mode.SUBTRACT)

    # CSK for #4 Flat Head Machine Screw1 at 5: CSK for #4 Flat Head Machine Screw1 ×2
    with Locations(*[Vector(0.242078526, 0, -0.97025666) * (i * CSK_FOR_4_FLAT_HEAD_MACHINE_SCREW1_AT_5_PITCH) for i in range(1, CSK_FOR_4_FLAT_HEAD_MACHINE_SCREW1_AT_5_COUNT)]):
        add(csk_for_4_flat_head_machine_screw1, mode=Mode.SUBTRACT)

    # CSK for #4 Flat Head Machine Screw1 at 6: CSK for #4 Flat Head Machine Screw1 ×2
    with Locations(*[(0, 0, -i * CSK_FOR_4_FLAT_HEAD_MACHINE_SCREW1_AT_6_PITCH) for i in range(1, CSK_FOR_4_FLAT_HEAD_MACHINE_SCREW1_AT_6_COUNT)]):
        add(csk_for_4_flat_head_machine_screw1, mode=Mode.SUBTRACT)


solid = part.part
